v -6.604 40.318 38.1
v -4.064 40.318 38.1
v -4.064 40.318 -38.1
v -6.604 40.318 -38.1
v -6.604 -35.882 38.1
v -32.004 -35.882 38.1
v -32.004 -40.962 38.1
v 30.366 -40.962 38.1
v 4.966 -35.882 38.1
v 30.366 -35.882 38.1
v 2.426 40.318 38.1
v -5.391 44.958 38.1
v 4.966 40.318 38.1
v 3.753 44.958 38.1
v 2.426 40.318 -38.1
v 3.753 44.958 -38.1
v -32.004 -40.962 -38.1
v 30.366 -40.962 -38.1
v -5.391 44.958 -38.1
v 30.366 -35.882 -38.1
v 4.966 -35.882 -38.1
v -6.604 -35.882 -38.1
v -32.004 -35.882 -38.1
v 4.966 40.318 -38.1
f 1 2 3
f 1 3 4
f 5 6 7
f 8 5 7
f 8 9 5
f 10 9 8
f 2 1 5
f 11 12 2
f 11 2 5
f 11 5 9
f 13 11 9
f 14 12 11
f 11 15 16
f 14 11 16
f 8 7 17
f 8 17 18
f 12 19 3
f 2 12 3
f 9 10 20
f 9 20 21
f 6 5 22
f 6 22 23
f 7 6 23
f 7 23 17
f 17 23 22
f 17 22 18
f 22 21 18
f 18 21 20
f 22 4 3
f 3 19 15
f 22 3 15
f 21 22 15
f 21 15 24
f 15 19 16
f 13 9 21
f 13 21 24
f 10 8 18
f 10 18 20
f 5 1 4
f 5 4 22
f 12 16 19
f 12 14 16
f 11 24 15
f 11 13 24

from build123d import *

# Parameters (mm, degrees)
F1_DEPTH = 38.1


with BuildPart() as f1:
    # F0 (on Top) → F1 (new body, symmetric)
    with BuildSketch(Plane.XY):
        Polygon((7.81685, 0), (-1.32715, 0), (0, -4.63993), (-2.54, -4.63993), (-2.54, -80.83993), (-27.94, -80.83993), (-27.94, -85.91993), (34.4297, -85.91993), (34.4297, -80.83993), (9.0297, -80.83993), (9.0297, -4.63993), (6.4897, -4.63993), align=None)
    extrude(amount=F1_DEPTH, both=True)


with BuildPart() as f1_1:
    # F2: moved
    add(f1.part.moved(Location((-4.064, 44.958, 0))))


solid = f1_1.part
